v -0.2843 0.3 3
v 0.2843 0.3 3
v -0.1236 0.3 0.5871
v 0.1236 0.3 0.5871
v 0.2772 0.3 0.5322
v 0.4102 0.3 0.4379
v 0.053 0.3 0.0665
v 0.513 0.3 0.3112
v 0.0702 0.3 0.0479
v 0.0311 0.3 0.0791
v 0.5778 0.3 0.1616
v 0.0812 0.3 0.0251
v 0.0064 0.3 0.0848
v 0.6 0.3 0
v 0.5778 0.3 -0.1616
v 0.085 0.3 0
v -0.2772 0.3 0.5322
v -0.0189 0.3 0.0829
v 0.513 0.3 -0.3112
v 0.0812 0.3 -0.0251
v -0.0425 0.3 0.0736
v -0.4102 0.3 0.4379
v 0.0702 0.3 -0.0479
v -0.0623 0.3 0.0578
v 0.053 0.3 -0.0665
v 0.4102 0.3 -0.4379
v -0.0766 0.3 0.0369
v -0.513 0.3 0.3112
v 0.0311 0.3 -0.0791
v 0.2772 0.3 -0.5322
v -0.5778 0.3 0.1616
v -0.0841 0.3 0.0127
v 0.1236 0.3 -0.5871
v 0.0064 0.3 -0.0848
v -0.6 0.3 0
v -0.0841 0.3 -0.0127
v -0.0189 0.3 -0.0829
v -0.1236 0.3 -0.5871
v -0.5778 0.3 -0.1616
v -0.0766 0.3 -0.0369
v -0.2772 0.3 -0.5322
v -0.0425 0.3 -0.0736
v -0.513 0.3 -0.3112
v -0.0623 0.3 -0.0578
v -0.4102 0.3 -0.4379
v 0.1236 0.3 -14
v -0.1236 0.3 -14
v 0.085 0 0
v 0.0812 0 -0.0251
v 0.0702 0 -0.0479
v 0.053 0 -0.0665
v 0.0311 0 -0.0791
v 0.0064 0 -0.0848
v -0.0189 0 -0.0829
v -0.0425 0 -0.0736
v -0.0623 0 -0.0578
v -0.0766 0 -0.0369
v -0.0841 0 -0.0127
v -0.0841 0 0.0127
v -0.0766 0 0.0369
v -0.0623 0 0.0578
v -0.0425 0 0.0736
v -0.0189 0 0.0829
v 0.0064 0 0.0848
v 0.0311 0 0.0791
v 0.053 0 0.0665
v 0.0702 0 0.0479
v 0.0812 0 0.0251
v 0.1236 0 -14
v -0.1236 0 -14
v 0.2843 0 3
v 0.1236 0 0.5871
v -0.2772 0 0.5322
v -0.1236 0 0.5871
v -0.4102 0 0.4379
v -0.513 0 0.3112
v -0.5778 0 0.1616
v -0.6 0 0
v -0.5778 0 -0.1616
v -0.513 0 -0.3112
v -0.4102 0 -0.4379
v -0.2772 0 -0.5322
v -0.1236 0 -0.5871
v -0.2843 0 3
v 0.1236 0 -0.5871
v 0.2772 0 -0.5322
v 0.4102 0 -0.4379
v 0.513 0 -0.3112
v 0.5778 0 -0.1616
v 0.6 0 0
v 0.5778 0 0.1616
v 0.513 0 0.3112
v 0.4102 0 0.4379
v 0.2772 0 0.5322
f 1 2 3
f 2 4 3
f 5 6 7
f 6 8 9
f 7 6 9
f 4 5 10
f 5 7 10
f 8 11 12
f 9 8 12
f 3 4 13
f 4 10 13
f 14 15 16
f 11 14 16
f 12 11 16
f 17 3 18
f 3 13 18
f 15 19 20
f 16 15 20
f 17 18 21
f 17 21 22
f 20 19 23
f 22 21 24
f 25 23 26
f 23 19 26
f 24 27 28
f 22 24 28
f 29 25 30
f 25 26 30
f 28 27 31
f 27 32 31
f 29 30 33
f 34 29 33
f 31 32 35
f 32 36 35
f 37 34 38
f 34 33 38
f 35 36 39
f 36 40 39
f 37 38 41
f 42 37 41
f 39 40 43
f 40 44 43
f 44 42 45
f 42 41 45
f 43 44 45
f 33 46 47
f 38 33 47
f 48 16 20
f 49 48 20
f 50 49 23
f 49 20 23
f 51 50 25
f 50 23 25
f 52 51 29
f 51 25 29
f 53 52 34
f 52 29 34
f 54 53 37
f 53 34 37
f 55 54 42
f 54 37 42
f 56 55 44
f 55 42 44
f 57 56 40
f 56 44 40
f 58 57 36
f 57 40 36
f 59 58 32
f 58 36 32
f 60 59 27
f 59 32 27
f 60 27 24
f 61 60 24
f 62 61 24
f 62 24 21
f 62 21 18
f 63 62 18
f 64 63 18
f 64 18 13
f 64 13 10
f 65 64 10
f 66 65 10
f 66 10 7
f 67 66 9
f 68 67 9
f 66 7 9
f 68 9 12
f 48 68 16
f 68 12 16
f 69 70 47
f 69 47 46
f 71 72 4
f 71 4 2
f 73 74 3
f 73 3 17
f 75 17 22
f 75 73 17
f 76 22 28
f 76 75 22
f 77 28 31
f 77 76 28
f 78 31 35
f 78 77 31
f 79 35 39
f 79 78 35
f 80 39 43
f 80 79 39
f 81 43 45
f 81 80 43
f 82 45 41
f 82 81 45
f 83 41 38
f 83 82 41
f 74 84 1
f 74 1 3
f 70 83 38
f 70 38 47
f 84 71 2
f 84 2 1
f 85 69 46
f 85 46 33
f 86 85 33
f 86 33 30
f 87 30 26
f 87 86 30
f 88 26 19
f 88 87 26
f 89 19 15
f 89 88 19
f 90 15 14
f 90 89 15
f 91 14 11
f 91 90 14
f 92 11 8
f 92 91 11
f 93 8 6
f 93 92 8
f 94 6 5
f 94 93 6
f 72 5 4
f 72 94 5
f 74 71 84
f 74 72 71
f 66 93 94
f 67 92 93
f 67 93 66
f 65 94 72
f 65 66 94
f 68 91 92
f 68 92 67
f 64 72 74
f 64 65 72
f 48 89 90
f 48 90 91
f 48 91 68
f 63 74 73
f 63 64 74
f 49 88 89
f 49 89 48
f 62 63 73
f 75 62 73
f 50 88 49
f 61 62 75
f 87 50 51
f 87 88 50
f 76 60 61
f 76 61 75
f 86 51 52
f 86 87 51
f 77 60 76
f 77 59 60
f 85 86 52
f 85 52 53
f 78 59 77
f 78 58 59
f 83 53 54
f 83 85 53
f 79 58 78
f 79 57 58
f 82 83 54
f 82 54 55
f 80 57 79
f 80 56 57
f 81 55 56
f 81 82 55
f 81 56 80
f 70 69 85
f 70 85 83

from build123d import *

# Parameters (mm, degrees)
BOSS_EXTRUDE1_DEPTH = 0.3
SKETCH2_R           = 0.085
CUT_EXTRUDE1_DEPTH  = 0.3


with BuildPart() as part:
    # Sketch1 → Boss-Extrude1 (new body)
    with BuildSketch(Plane(origin=(0, 0, 0), x_dir=(1, 0, 0), z_dir=(0, 1, 0))):
        with BuildLine():
            Line((0.284268307, -3), (-0.284268307, -3))
            Line((-0.284268307, -3), (-0.123615756, -0.587127878))
            ThreePointArc((-0.123615756, -0.587127878), (-0.6, 0), (-0.123615756, 0.587127878))
            Line((-0.123615756, 0.587127878), (-0.123615756, 14))
            Line((-0.123615756, 14), (0.123615756, 14))
            Line((0.123615756, 14), (0.123615756, 0.587127878))
            ThreePointArc((0.123615756, 0.587127878), (0.6, 0), (0.123615756, -0.587127878))
            Line((0.123615756, -0.587127878), (0.284268307, -3))
        make_face()
    extrude(amount=BOSS_EXTRUDE1_DEPTH)

    # Sketch2 → Cut-Extrude1 (cut)
    with BuildSketch(Plane(origin=(0, 0.3, 0), x_dir=(1, 0, 0), z_dir=(0, 1, 0))):
        Circle(SKETCH2_R)
    extrude(amount=-CUT_EXTRUDE1_DEPTH, mode=Mode.SUBTRACT)


solid = part.part
